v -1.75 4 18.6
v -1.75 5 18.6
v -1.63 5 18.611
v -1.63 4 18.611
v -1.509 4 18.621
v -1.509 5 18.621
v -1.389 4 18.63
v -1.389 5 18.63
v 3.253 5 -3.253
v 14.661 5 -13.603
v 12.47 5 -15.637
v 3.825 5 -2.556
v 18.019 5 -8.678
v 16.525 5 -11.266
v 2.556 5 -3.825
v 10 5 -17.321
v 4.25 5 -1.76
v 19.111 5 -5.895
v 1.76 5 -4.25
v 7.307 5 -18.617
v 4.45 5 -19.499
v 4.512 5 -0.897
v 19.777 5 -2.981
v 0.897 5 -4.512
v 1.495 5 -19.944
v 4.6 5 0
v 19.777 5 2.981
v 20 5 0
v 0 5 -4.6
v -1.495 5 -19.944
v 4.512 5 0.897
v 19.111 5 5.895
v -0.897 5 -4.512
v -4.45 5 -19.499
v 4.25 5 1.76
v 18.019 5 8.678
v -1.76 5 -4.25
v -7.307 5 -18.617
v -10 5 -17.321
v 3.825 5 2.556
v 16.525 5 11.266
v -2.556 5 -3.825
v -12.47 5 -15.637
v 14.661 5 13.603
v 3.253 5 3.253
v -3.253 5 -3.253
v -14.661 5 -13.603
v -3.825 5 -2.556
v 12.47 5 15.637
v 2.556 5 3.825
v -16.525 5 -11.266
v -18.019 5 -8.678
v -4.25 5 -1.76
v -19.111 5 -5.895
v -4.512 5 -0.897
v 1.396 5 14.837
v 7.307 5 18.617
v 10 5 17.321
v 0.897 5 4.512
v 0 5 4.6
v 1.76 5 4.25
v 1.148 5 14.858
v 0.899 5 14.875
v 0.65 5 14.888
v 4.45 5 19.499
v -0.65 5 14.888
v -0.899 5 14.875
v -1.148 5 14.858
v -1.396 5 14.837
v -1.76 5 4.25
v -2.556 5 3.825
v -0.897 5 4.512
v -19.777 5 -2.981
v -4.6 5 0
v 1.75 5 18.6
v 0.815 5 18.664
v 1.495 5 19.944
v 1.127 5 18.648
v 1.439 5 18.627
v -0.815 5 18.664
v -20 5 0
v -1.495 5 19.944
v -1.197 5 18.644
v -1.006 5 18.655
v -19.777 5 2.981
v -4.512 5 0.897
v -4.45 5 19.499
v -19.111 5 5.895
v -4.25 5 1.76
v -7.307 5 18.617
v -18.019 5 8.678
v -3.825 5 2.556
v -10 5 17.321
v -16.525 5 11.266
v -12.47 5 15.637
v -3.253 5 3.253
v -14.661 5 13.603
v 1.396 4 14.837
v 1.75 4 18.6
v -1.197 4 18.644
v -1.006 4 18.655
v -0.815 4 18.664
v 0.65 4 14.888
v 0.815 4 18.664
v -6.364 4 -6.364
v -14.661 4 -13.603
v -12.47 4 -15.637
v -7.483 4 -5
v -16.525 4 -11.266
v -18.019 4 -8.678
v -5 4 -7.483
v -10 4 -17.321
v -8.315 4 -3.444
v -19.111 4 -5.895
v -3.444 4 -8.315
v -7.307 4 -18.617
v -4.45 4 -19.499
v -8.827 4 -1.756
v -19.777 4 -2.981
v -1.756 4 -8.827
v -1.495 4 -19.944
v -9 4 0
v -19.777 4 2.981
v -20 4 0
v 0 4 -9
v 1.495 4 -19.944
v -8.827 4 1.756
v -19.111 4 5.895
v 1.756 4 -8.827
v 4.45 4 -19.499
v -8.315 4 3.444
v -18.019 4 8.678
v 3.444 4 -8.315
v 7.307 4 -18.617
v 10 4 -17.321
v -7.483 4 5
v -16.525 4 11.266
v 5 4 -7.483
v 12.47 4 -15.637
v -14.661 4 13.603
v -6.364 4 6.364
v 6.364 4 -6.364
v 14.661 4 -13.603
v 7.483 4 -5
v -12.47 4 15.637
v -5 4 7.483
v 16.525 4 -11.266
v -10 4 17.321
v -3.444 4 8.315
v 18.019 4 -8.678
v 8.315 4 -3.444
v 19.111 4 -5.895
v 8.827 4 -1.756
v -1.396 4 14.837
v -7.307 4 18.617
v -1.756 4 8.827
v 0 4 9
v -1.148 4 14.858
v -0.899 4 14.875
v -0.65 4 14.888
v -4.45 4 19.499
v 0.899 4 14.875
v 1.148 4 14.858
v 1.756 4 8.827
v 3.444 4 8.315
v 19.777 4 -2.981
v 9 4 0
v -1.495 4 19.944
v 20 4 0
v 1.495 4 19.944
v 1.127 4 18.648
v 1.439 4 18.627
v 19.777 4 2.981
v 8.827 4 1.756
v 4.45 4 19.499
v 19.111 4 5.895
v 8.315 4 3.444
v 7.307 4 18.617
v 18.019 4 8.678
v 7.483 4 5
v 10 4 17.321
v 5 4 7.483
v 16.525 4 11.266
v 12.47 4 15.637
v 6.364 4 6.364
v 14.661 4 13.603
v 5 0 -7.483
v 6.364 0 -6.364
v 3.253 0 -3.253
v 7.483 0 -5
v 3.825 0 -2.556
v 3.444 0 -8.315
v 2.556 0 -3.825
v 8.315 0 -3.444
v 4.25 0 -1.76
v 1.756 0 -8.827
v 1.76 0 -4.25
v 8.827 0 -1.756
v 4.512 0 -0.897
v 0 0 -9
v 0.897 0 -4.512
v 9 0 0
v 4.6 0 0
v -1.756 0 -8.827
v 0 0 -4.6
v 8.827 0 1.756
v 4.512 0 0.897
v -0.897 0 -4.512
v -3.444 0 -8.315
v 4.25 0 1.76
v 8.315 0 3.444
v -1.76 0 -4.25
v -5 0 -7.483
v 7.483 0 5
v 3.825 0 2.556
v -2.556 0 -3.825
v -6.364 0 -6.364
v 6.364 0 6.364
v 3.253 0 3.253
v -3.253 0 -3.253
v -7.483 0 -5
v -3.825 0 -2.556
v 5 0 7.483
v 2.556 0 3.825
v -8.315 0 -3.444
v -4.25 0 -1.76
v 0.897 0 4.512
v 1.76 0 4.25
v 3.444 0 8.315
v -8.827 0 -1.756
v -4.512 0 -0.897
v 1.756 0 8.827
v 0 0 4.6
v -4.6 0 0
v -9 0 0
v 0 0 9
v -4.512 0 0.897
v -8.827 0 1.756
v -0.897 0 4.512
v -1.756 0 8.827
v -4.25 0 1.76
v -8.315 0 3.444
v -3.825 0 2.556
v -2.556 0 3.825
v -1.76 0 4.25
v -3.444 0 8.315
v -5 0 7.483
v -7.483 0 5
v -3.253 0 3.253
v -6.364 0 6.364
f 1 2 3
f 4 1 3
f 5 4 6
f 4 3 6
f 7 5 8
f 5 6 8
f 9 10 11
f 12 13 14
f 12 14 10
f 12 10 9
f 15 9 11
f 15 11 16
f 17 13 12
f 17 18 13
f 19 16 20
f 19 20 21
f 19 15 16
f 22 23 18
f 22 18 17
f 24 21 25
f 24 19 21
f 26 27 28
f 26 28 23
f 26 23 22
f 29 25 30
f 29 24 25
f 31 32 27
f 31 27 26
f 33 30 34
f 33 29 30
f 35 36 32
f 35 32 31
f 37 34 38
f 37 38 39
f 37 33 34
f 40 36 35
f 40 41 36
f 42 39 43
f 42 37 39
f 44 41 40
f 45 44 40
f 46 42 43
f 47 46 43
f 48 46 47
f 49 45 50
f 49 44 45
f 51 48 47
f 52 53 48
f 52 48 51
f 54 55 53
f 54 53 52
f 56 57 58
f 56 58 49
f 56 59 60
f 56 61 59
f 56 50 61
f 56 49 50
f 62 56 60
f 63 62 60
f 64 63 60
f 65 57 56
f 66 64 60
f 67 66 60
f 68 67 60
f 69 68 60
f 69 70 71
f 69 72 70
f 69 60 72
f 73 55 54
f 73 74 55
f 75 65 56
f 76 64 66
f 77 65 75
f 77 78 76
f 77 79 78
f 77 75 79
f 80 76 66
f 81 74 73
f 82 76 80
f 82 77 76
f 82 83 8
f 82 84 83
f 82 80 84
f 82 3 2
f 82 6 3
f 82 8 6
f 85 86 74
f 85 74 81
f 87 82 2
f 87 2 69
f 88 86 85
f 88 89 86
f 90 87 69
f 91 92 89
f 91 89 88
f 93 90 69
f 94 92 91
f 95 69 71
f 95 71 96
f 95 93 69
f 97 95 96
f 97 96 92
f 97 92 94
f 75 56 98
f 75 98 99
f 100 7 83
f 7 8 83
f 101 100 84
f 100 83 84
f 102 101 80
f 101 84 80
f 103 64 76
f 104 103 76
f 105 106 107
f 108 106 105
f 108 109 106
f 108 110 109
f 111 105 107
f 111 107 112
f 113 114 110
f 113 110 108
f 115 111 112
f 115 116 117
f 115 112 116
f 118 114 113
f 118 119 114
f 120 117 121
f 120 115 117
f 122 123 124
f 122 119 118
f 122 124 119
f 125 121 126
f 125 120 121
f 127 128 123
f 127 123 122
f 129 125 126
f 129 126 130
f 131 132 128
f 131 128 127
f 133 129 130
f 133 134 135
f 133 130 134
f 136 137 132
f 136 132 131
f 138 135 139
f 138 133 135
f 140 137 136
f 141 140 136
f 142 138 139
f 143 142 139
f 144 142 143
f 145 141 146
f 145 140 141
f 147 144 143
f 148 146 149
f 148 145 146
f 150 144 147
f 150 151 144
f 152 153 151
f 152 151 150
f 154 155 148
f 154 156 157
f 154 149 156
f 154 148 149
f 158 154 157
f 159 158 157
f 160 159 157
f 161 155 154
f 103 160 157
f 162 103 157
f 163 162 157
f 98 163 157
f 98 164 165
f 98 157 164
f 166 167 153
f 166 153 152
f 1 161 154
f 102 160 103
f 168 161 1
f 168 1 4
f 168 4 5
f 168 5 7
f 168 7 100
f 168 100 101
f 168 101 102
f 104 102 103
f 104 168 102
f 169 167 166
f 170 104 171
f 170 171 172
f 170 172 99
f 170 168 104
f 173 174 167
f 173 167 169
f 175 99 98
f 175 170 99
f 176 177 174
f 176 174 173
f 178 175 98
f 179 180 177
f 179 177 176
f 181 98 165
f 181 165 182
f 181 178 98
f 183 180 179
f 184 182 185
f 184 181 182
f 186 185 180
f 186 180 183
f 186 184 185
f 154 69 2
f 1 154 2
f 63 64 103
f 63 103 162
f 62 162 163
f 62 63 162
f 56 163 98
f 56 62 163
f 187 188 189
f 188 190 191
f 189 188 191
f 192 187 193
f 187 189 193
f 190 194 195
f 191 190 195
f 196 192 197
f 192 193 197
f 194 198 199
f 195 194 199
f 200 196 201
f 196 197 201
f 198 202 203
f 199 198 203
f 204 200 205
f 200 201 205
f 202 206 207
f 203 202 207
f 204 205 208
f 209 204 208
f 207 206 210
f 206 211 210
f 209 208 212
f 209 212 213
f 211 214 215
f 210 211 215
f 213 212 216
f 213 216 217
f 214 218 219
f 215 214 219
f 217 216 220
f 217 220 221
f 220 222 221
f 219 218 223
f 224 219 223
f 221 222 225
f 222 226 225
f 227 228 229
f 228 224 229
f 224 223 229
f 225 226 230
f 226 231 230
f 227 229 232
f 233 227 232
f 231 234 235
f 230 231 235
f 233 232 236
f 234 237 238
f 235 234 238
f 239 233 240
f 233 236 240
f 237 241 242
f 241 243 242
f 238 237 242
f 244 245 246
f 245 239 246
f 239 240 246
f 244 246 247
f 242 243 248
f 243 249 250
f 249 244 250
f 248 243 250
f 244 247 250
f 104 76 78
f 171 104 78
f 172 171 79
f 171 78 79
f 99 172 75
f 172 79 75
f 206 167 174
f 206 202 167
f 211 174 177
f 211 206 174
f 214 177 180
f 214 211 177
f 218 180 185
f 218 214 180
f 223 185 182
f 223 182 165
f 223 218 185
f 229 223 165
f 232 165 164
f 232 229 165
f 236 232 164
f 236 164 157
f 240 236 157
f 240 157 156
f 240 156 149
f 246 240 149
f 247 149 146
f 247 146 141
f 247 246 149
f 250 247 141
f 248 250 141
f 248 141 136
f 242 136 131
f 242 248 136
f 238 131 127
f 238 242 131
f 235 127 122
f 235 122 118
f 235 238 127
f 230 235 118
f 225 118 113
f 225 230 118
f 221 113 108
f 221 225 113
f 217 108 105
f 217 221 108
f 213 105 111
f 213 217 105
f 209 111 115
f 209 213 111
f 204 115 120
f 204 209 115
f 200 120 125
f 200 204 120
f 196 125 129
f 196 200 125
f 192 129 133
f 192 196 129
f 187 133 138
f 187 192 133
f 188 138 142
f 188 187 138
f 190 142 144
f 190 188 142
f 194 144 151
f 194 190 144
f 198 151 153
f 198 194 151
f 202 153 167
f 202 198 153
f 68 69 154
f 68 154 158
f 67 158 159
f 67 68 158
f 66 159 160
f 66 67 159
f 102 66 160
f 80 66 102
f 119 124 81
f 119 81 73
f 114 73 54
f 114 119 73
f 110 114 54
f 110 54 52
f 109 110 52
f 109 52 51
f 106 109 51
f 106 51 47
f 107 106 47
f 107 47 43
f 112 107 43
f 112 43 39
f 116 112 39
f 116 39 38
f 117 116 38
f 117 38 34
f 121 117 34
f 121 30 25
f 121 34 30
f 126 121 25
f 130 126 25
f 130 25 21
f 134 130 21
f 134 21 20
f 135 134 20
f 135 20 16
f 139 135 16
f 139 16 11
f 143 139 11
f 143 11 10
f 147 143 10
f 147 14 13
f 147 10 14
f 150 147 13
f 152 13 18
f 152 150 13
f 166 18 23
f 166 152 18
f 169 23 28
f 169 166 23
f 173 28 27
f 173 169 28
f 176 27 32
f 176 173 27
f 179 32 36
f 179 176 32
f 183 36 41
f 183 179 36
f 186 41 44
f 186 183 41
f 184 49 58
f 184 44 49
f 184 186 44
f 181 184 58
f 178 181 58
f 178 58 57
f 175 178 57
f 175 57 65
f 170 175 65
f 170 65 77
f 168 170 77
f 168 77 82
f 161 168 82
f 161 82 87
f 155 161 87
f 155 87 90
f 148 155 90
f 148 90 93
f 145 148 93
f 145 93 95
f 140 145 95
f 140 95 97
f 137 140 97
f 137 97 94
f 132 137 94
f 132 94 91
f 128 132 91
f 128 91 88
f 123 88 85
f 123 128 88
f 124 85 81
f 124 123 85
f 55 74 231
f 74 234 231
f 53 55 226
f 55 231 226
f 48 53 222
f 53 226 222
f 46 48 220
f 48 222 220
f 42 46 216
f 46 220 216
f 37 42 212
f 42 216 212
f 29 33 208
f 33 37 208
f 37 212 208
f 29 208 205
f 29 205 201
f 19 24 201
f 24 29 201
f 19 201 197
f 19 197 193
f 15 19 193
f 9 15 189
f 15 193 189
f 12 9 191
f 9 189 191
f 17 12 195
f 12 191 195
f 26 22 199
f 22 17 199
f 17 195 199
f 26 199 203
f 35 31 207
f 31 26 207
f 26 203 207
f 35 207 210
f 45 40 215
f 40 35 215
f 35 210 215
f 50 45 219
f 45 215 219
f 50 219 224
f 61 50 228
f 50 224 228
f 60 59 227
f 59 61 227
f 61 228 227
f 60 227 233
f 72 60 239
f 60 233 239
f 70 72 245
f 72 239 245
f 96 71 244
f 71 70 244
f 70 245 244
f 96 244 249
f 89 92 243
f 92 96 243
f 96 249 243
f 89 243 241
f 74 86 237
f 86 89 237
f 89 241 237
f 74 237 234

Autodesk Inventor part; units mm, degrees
ref_plane "YZ Plane" through (0, 0, 0) normal (1, 0, 0) x (0, 1, 0)
ref_plane "XZ Plane" through (0, 0, 0) normal (0, 1, 0) x (-1, 0, 0)
ref_plane "XY Plane" through (0, 0, 0) normal (0, 0, 1) x (1, 0, 0)
sketch "Sketch1" plane through (0, 0, 0) normal (0, 1, 0) x (-1, 0, 0)
  circle A0 centre (0, 0) radius 20
  line L0 (0, 0) -> (20, 0)
  circle A1 centre (0, 0) radius 4.6
  dimension "d1" = 40
  dimension "d6" = 9.2
extrude "Extrusion1" add sketch "Sketch1" along normal blind 5
sketch "Sketch2" plane through (0, 0, 0) normal (0, -1, 0) x (1, 0, 0)
  circle A0 centre (0, 0) radius 4.6 projected
  circle A1 centre (0, 0) radius 20 projected
  circle A2 centre (0, 0) radius 9
  circle A3 centre (0, 0) radius 20
  dimension "d7" = 18
extrude "Extrusion2" cut sketch "Sketch2" against normal blind 4 contours A1
sketch "Sketch3" plane through (0, 5, 0) normal (0, 1, 0) x (1, 0, 0)
  circle A0 centre (0, 0) radius 4.6 projected
  circle A1 centre (0, 0) radius 20 projected
  line L0 (0, 0) -> (0, -20)
  circle A2 centre (0, 0) radius 20 projected
  line L1 (2.4, -13.5) -> (2.4, -20)
  line L2 (2.4, -20) -> (-2.4, -20)
  line L3 (-2.4, -20) -> (-2.4, -13.5)
  line L4 (-2.4, -13.5) -> (2.4, -13.5)
  line L5 (2.4, -13.5) -> (-2.4, -20) construction
  line L6 (2.4, -20) -> (-2.4, -13.5) construction
  line L7 (0.25, -18.6) -> (1.75, -18.6)
  line L8 (1.75, -18.6) -> (1.75, -14.9)
  line L9 (1.75, -14.9) -> (0.25, -14.9)
  line L10 (0.25, -14.9) -> (0.25, -18.6)
  line L11 (-0.25, -18.6) -> (-1.75, -18.6)
  line L12 (-1.75, -18.6) -> (-1.75, -14.9)
  line L13 (-1.75, -14.9) -> (-0.25, -14.9)
  line L14 (-0.25, -14.9) -> (-0.25, -18.6)
  arc A3 (-0.8149, -18.6644) -> (-1.75, -18.6) centre (0, 0) ccw
  arc A4 (-0.65, -14.8879) -> (-1.3959, -14.8366) centre (0, 0) ccw
  line L15 (0, 0) -> (-0.65, -14.8879)
  line L16 (0, 0) -> (0.65, -14.8879)
  line L17 (0, 0) -> (-1.3959, -14.8366)
  line L18 (0, 0) -> (1.3959, -14.8366)
  arc A5 (-1.3959, -14.8366) -> (-0.65, -14.8879) centre (0, 0) ccw
  arc A6 (-1.3886, -18.6305) -> (-0.8149, -18.6644) centre (0, 0) ccw
  arc A7 (-1.75, -18.6) -> (-1.3886, -18.6305) centre (0, 0) ccw
  line L19 (-0.65, -14.8879) -> (-0.8149, -18.6644)
  line L20 (-1.3959, -14.8366) -> (-1.75, -18.6)
  line L21 (1.3959, -14.8366) -> (1.75, -18.6)
  line L22 (0.65, -14.8879) -> (0.8149, -18.6644)
  point P0 (0, -16.75)
  dimension "d10" = 0
  dimension "d11" = 4.8
  dimension "d12" = 6.5
  dimension "d13" = 1.5
  dimension "d14" = 3.7
  dimension "d17" = 1.4
  dimension "d40" = 2
  dimension "d41" = 0.25
  dimension "d76" = 5
  dimension "d77" = 2.5
extrude "Extrusion4" cut sketch "Sketch3" against normal blind 10 contours A5 L19 L13 L20 | L21 L9 L22 A4 | L13 L19 L11 L20 | L21 L7 L22 L9 | L11 L19 A6 A7 | A3 L22 L7
equation "\"d17\" = -0.5 * d14 + 0.5 * d12"
equation "\"d41\" = -0.5 * d13 + 0.5 * d40"
equation "\"d77\" = 0.5 * d76"
properties part number "BigPositionDisk"
